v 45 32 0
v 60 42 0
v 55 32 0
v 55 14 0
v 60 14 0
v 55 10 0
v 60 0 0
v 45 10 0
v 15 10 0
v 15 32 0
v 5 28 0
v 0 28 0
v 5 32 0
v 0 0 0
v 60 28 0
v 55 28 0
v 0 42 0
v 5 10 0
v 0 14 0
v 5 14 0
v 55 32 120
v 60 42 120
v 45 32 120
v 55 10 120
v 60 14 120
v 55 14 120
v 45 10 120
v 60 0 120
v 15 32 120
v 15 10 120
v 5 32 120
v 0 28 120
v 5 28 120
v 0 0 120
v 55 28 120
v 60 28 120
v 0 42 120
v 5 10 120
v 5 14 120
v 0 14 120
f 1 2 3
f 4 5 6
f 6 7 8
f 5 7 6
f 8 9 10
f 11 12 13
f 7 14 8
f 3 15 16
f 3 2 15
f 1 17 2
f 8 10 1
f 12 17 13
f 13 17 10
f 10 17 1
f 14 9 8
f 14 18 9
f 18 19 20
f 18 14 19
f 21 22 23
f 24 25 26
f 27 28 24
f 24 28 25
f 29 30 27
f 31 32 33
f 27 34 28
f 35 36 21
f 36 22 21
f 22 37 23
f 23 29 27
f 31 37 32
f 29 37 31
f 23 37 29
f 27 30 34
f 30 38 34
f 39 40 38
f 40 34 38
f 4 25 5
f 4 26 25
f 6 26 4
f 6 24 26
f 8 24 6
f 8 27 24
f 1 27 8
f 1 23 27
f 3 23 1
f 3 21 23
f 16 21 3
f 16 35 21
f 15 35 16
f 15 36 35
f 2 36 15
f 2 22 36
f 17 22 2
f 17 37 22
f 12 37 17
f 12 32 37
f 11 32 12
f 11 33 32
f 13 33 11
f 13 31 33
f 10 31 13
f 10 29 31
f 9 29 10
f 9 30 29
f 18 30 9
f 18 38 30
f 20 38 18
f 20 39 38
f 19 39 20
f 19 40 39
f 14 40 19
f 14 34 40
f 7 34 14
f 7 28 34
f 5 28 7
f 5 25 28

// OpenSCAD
$fn = 32;

// ----------------------------------------------------------------------
// T-slot rail: 60 x 42 mm section, 120 mm long
// ----------------------------------------------------------------------

// --- parameters (mm) ---
profile_height = 120;     // extrusion height
profile_points = 20;      // points of the closed outline

profile = [[0, 0], [60, 0], [60, 14], [55, 14], [55, 10], [45, 10], [45, 32], [55, 32], [55, 28], [60, 28], [60, 42], [0, 42], [0, 28], [5, 28], [5, 32], [15, 32], [15, 10], [5, 10], [5, 14], [0, 14]];  // single closed polygon, 20 points, counter clockwise

// --- the one profile operation ---
linear_extrude(height = profile_height) polygon(points = profile);
